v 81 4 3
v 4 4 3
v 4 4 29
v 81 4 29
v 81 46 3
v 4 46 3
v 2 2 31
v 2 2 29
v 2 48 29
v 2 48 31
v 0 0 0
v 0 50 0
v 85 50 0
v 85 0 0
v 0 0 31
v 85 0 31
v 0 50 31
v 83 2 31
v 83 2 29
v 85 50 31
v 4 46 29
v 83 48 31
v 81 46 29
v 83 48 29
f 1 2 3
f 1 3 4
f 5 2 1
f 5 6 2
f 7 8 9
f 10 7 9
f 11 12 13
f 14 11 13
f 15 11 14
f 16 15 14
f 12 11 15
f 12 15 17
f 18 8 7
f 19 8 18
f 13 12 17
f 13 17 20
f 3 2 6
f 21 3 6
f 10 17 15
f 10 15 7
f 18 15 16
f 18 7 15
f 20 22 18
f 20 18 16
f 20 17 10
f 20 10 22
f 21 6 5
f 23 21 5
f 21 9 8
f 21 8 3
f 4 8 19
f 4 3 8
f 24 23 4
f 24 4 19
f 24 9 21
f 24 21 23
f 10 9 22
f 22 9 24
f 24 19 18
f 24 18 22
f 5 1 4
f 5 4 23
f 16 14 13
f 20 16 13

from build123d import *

# Parameters (mm, degrees)
SKICA1_W                = 85
SKICA1_H                = 50
P_IDAT_VYSUNUT_M1_DEPTH = 3
SKICA1_5_W              = 85
SKICA1_5_H              = 50
SKICA1_5_W_2            = 81
SKICA1_5_H_2            = 46
P_IDAT_VYSUNUT_M2_DEPTH = 31
SKICA1_6_W              = 81
SKICA1_6_H              = 46
SKICA1_6_W_2            = 77
SKICA1_6_H_2            = 42
P_IDAT_VYSUNUT_M3_DEPTH = 29


with BuildPart() as part:
    # Skica1 → Přidat vysunutím1 (new body)
    with BuildSketch(Plane.XY):
        with Locations((42.5, 25)):
            Rectangle(SKICA1_W, SKICA1_H)
    extrude(amount=P_IDAT_VYSUNUT_M1_DEPTH)

    # Skica1<5> → Přidat vysunutím2 (add)
    with BuildSketch(Plane.XY):
        with Locations((42.5, 25)):
            Rectangle(SKICA1_5_W, SKICA1_5_H)
        with Locations((42.5, 25)):
            Rectangle(SKICA1_5_W_2, SKICA1_5_H_2, mode=Mode.SUBTRACT)
    extrude(amount=P_IDAT_VYSUNUT_M2_DEPTH)

    # Skica1<6> → Přidat vysunutím3 (add)
    with BuildSketch(Plane.XY):
        with Locations((42.5, 25)):
            Rectangle(SKICA1_6_W, SKICA1_6_H)
        with Locations((42.5, 25)):
            Rectangle(SKICA1_6_W_2, SKICA1_6_H_2, mode=Mode.SUBTRACT)
    extrude(amount=P_IDAT_VYSUNUT_M3_DEPTH)


solid = part.part
